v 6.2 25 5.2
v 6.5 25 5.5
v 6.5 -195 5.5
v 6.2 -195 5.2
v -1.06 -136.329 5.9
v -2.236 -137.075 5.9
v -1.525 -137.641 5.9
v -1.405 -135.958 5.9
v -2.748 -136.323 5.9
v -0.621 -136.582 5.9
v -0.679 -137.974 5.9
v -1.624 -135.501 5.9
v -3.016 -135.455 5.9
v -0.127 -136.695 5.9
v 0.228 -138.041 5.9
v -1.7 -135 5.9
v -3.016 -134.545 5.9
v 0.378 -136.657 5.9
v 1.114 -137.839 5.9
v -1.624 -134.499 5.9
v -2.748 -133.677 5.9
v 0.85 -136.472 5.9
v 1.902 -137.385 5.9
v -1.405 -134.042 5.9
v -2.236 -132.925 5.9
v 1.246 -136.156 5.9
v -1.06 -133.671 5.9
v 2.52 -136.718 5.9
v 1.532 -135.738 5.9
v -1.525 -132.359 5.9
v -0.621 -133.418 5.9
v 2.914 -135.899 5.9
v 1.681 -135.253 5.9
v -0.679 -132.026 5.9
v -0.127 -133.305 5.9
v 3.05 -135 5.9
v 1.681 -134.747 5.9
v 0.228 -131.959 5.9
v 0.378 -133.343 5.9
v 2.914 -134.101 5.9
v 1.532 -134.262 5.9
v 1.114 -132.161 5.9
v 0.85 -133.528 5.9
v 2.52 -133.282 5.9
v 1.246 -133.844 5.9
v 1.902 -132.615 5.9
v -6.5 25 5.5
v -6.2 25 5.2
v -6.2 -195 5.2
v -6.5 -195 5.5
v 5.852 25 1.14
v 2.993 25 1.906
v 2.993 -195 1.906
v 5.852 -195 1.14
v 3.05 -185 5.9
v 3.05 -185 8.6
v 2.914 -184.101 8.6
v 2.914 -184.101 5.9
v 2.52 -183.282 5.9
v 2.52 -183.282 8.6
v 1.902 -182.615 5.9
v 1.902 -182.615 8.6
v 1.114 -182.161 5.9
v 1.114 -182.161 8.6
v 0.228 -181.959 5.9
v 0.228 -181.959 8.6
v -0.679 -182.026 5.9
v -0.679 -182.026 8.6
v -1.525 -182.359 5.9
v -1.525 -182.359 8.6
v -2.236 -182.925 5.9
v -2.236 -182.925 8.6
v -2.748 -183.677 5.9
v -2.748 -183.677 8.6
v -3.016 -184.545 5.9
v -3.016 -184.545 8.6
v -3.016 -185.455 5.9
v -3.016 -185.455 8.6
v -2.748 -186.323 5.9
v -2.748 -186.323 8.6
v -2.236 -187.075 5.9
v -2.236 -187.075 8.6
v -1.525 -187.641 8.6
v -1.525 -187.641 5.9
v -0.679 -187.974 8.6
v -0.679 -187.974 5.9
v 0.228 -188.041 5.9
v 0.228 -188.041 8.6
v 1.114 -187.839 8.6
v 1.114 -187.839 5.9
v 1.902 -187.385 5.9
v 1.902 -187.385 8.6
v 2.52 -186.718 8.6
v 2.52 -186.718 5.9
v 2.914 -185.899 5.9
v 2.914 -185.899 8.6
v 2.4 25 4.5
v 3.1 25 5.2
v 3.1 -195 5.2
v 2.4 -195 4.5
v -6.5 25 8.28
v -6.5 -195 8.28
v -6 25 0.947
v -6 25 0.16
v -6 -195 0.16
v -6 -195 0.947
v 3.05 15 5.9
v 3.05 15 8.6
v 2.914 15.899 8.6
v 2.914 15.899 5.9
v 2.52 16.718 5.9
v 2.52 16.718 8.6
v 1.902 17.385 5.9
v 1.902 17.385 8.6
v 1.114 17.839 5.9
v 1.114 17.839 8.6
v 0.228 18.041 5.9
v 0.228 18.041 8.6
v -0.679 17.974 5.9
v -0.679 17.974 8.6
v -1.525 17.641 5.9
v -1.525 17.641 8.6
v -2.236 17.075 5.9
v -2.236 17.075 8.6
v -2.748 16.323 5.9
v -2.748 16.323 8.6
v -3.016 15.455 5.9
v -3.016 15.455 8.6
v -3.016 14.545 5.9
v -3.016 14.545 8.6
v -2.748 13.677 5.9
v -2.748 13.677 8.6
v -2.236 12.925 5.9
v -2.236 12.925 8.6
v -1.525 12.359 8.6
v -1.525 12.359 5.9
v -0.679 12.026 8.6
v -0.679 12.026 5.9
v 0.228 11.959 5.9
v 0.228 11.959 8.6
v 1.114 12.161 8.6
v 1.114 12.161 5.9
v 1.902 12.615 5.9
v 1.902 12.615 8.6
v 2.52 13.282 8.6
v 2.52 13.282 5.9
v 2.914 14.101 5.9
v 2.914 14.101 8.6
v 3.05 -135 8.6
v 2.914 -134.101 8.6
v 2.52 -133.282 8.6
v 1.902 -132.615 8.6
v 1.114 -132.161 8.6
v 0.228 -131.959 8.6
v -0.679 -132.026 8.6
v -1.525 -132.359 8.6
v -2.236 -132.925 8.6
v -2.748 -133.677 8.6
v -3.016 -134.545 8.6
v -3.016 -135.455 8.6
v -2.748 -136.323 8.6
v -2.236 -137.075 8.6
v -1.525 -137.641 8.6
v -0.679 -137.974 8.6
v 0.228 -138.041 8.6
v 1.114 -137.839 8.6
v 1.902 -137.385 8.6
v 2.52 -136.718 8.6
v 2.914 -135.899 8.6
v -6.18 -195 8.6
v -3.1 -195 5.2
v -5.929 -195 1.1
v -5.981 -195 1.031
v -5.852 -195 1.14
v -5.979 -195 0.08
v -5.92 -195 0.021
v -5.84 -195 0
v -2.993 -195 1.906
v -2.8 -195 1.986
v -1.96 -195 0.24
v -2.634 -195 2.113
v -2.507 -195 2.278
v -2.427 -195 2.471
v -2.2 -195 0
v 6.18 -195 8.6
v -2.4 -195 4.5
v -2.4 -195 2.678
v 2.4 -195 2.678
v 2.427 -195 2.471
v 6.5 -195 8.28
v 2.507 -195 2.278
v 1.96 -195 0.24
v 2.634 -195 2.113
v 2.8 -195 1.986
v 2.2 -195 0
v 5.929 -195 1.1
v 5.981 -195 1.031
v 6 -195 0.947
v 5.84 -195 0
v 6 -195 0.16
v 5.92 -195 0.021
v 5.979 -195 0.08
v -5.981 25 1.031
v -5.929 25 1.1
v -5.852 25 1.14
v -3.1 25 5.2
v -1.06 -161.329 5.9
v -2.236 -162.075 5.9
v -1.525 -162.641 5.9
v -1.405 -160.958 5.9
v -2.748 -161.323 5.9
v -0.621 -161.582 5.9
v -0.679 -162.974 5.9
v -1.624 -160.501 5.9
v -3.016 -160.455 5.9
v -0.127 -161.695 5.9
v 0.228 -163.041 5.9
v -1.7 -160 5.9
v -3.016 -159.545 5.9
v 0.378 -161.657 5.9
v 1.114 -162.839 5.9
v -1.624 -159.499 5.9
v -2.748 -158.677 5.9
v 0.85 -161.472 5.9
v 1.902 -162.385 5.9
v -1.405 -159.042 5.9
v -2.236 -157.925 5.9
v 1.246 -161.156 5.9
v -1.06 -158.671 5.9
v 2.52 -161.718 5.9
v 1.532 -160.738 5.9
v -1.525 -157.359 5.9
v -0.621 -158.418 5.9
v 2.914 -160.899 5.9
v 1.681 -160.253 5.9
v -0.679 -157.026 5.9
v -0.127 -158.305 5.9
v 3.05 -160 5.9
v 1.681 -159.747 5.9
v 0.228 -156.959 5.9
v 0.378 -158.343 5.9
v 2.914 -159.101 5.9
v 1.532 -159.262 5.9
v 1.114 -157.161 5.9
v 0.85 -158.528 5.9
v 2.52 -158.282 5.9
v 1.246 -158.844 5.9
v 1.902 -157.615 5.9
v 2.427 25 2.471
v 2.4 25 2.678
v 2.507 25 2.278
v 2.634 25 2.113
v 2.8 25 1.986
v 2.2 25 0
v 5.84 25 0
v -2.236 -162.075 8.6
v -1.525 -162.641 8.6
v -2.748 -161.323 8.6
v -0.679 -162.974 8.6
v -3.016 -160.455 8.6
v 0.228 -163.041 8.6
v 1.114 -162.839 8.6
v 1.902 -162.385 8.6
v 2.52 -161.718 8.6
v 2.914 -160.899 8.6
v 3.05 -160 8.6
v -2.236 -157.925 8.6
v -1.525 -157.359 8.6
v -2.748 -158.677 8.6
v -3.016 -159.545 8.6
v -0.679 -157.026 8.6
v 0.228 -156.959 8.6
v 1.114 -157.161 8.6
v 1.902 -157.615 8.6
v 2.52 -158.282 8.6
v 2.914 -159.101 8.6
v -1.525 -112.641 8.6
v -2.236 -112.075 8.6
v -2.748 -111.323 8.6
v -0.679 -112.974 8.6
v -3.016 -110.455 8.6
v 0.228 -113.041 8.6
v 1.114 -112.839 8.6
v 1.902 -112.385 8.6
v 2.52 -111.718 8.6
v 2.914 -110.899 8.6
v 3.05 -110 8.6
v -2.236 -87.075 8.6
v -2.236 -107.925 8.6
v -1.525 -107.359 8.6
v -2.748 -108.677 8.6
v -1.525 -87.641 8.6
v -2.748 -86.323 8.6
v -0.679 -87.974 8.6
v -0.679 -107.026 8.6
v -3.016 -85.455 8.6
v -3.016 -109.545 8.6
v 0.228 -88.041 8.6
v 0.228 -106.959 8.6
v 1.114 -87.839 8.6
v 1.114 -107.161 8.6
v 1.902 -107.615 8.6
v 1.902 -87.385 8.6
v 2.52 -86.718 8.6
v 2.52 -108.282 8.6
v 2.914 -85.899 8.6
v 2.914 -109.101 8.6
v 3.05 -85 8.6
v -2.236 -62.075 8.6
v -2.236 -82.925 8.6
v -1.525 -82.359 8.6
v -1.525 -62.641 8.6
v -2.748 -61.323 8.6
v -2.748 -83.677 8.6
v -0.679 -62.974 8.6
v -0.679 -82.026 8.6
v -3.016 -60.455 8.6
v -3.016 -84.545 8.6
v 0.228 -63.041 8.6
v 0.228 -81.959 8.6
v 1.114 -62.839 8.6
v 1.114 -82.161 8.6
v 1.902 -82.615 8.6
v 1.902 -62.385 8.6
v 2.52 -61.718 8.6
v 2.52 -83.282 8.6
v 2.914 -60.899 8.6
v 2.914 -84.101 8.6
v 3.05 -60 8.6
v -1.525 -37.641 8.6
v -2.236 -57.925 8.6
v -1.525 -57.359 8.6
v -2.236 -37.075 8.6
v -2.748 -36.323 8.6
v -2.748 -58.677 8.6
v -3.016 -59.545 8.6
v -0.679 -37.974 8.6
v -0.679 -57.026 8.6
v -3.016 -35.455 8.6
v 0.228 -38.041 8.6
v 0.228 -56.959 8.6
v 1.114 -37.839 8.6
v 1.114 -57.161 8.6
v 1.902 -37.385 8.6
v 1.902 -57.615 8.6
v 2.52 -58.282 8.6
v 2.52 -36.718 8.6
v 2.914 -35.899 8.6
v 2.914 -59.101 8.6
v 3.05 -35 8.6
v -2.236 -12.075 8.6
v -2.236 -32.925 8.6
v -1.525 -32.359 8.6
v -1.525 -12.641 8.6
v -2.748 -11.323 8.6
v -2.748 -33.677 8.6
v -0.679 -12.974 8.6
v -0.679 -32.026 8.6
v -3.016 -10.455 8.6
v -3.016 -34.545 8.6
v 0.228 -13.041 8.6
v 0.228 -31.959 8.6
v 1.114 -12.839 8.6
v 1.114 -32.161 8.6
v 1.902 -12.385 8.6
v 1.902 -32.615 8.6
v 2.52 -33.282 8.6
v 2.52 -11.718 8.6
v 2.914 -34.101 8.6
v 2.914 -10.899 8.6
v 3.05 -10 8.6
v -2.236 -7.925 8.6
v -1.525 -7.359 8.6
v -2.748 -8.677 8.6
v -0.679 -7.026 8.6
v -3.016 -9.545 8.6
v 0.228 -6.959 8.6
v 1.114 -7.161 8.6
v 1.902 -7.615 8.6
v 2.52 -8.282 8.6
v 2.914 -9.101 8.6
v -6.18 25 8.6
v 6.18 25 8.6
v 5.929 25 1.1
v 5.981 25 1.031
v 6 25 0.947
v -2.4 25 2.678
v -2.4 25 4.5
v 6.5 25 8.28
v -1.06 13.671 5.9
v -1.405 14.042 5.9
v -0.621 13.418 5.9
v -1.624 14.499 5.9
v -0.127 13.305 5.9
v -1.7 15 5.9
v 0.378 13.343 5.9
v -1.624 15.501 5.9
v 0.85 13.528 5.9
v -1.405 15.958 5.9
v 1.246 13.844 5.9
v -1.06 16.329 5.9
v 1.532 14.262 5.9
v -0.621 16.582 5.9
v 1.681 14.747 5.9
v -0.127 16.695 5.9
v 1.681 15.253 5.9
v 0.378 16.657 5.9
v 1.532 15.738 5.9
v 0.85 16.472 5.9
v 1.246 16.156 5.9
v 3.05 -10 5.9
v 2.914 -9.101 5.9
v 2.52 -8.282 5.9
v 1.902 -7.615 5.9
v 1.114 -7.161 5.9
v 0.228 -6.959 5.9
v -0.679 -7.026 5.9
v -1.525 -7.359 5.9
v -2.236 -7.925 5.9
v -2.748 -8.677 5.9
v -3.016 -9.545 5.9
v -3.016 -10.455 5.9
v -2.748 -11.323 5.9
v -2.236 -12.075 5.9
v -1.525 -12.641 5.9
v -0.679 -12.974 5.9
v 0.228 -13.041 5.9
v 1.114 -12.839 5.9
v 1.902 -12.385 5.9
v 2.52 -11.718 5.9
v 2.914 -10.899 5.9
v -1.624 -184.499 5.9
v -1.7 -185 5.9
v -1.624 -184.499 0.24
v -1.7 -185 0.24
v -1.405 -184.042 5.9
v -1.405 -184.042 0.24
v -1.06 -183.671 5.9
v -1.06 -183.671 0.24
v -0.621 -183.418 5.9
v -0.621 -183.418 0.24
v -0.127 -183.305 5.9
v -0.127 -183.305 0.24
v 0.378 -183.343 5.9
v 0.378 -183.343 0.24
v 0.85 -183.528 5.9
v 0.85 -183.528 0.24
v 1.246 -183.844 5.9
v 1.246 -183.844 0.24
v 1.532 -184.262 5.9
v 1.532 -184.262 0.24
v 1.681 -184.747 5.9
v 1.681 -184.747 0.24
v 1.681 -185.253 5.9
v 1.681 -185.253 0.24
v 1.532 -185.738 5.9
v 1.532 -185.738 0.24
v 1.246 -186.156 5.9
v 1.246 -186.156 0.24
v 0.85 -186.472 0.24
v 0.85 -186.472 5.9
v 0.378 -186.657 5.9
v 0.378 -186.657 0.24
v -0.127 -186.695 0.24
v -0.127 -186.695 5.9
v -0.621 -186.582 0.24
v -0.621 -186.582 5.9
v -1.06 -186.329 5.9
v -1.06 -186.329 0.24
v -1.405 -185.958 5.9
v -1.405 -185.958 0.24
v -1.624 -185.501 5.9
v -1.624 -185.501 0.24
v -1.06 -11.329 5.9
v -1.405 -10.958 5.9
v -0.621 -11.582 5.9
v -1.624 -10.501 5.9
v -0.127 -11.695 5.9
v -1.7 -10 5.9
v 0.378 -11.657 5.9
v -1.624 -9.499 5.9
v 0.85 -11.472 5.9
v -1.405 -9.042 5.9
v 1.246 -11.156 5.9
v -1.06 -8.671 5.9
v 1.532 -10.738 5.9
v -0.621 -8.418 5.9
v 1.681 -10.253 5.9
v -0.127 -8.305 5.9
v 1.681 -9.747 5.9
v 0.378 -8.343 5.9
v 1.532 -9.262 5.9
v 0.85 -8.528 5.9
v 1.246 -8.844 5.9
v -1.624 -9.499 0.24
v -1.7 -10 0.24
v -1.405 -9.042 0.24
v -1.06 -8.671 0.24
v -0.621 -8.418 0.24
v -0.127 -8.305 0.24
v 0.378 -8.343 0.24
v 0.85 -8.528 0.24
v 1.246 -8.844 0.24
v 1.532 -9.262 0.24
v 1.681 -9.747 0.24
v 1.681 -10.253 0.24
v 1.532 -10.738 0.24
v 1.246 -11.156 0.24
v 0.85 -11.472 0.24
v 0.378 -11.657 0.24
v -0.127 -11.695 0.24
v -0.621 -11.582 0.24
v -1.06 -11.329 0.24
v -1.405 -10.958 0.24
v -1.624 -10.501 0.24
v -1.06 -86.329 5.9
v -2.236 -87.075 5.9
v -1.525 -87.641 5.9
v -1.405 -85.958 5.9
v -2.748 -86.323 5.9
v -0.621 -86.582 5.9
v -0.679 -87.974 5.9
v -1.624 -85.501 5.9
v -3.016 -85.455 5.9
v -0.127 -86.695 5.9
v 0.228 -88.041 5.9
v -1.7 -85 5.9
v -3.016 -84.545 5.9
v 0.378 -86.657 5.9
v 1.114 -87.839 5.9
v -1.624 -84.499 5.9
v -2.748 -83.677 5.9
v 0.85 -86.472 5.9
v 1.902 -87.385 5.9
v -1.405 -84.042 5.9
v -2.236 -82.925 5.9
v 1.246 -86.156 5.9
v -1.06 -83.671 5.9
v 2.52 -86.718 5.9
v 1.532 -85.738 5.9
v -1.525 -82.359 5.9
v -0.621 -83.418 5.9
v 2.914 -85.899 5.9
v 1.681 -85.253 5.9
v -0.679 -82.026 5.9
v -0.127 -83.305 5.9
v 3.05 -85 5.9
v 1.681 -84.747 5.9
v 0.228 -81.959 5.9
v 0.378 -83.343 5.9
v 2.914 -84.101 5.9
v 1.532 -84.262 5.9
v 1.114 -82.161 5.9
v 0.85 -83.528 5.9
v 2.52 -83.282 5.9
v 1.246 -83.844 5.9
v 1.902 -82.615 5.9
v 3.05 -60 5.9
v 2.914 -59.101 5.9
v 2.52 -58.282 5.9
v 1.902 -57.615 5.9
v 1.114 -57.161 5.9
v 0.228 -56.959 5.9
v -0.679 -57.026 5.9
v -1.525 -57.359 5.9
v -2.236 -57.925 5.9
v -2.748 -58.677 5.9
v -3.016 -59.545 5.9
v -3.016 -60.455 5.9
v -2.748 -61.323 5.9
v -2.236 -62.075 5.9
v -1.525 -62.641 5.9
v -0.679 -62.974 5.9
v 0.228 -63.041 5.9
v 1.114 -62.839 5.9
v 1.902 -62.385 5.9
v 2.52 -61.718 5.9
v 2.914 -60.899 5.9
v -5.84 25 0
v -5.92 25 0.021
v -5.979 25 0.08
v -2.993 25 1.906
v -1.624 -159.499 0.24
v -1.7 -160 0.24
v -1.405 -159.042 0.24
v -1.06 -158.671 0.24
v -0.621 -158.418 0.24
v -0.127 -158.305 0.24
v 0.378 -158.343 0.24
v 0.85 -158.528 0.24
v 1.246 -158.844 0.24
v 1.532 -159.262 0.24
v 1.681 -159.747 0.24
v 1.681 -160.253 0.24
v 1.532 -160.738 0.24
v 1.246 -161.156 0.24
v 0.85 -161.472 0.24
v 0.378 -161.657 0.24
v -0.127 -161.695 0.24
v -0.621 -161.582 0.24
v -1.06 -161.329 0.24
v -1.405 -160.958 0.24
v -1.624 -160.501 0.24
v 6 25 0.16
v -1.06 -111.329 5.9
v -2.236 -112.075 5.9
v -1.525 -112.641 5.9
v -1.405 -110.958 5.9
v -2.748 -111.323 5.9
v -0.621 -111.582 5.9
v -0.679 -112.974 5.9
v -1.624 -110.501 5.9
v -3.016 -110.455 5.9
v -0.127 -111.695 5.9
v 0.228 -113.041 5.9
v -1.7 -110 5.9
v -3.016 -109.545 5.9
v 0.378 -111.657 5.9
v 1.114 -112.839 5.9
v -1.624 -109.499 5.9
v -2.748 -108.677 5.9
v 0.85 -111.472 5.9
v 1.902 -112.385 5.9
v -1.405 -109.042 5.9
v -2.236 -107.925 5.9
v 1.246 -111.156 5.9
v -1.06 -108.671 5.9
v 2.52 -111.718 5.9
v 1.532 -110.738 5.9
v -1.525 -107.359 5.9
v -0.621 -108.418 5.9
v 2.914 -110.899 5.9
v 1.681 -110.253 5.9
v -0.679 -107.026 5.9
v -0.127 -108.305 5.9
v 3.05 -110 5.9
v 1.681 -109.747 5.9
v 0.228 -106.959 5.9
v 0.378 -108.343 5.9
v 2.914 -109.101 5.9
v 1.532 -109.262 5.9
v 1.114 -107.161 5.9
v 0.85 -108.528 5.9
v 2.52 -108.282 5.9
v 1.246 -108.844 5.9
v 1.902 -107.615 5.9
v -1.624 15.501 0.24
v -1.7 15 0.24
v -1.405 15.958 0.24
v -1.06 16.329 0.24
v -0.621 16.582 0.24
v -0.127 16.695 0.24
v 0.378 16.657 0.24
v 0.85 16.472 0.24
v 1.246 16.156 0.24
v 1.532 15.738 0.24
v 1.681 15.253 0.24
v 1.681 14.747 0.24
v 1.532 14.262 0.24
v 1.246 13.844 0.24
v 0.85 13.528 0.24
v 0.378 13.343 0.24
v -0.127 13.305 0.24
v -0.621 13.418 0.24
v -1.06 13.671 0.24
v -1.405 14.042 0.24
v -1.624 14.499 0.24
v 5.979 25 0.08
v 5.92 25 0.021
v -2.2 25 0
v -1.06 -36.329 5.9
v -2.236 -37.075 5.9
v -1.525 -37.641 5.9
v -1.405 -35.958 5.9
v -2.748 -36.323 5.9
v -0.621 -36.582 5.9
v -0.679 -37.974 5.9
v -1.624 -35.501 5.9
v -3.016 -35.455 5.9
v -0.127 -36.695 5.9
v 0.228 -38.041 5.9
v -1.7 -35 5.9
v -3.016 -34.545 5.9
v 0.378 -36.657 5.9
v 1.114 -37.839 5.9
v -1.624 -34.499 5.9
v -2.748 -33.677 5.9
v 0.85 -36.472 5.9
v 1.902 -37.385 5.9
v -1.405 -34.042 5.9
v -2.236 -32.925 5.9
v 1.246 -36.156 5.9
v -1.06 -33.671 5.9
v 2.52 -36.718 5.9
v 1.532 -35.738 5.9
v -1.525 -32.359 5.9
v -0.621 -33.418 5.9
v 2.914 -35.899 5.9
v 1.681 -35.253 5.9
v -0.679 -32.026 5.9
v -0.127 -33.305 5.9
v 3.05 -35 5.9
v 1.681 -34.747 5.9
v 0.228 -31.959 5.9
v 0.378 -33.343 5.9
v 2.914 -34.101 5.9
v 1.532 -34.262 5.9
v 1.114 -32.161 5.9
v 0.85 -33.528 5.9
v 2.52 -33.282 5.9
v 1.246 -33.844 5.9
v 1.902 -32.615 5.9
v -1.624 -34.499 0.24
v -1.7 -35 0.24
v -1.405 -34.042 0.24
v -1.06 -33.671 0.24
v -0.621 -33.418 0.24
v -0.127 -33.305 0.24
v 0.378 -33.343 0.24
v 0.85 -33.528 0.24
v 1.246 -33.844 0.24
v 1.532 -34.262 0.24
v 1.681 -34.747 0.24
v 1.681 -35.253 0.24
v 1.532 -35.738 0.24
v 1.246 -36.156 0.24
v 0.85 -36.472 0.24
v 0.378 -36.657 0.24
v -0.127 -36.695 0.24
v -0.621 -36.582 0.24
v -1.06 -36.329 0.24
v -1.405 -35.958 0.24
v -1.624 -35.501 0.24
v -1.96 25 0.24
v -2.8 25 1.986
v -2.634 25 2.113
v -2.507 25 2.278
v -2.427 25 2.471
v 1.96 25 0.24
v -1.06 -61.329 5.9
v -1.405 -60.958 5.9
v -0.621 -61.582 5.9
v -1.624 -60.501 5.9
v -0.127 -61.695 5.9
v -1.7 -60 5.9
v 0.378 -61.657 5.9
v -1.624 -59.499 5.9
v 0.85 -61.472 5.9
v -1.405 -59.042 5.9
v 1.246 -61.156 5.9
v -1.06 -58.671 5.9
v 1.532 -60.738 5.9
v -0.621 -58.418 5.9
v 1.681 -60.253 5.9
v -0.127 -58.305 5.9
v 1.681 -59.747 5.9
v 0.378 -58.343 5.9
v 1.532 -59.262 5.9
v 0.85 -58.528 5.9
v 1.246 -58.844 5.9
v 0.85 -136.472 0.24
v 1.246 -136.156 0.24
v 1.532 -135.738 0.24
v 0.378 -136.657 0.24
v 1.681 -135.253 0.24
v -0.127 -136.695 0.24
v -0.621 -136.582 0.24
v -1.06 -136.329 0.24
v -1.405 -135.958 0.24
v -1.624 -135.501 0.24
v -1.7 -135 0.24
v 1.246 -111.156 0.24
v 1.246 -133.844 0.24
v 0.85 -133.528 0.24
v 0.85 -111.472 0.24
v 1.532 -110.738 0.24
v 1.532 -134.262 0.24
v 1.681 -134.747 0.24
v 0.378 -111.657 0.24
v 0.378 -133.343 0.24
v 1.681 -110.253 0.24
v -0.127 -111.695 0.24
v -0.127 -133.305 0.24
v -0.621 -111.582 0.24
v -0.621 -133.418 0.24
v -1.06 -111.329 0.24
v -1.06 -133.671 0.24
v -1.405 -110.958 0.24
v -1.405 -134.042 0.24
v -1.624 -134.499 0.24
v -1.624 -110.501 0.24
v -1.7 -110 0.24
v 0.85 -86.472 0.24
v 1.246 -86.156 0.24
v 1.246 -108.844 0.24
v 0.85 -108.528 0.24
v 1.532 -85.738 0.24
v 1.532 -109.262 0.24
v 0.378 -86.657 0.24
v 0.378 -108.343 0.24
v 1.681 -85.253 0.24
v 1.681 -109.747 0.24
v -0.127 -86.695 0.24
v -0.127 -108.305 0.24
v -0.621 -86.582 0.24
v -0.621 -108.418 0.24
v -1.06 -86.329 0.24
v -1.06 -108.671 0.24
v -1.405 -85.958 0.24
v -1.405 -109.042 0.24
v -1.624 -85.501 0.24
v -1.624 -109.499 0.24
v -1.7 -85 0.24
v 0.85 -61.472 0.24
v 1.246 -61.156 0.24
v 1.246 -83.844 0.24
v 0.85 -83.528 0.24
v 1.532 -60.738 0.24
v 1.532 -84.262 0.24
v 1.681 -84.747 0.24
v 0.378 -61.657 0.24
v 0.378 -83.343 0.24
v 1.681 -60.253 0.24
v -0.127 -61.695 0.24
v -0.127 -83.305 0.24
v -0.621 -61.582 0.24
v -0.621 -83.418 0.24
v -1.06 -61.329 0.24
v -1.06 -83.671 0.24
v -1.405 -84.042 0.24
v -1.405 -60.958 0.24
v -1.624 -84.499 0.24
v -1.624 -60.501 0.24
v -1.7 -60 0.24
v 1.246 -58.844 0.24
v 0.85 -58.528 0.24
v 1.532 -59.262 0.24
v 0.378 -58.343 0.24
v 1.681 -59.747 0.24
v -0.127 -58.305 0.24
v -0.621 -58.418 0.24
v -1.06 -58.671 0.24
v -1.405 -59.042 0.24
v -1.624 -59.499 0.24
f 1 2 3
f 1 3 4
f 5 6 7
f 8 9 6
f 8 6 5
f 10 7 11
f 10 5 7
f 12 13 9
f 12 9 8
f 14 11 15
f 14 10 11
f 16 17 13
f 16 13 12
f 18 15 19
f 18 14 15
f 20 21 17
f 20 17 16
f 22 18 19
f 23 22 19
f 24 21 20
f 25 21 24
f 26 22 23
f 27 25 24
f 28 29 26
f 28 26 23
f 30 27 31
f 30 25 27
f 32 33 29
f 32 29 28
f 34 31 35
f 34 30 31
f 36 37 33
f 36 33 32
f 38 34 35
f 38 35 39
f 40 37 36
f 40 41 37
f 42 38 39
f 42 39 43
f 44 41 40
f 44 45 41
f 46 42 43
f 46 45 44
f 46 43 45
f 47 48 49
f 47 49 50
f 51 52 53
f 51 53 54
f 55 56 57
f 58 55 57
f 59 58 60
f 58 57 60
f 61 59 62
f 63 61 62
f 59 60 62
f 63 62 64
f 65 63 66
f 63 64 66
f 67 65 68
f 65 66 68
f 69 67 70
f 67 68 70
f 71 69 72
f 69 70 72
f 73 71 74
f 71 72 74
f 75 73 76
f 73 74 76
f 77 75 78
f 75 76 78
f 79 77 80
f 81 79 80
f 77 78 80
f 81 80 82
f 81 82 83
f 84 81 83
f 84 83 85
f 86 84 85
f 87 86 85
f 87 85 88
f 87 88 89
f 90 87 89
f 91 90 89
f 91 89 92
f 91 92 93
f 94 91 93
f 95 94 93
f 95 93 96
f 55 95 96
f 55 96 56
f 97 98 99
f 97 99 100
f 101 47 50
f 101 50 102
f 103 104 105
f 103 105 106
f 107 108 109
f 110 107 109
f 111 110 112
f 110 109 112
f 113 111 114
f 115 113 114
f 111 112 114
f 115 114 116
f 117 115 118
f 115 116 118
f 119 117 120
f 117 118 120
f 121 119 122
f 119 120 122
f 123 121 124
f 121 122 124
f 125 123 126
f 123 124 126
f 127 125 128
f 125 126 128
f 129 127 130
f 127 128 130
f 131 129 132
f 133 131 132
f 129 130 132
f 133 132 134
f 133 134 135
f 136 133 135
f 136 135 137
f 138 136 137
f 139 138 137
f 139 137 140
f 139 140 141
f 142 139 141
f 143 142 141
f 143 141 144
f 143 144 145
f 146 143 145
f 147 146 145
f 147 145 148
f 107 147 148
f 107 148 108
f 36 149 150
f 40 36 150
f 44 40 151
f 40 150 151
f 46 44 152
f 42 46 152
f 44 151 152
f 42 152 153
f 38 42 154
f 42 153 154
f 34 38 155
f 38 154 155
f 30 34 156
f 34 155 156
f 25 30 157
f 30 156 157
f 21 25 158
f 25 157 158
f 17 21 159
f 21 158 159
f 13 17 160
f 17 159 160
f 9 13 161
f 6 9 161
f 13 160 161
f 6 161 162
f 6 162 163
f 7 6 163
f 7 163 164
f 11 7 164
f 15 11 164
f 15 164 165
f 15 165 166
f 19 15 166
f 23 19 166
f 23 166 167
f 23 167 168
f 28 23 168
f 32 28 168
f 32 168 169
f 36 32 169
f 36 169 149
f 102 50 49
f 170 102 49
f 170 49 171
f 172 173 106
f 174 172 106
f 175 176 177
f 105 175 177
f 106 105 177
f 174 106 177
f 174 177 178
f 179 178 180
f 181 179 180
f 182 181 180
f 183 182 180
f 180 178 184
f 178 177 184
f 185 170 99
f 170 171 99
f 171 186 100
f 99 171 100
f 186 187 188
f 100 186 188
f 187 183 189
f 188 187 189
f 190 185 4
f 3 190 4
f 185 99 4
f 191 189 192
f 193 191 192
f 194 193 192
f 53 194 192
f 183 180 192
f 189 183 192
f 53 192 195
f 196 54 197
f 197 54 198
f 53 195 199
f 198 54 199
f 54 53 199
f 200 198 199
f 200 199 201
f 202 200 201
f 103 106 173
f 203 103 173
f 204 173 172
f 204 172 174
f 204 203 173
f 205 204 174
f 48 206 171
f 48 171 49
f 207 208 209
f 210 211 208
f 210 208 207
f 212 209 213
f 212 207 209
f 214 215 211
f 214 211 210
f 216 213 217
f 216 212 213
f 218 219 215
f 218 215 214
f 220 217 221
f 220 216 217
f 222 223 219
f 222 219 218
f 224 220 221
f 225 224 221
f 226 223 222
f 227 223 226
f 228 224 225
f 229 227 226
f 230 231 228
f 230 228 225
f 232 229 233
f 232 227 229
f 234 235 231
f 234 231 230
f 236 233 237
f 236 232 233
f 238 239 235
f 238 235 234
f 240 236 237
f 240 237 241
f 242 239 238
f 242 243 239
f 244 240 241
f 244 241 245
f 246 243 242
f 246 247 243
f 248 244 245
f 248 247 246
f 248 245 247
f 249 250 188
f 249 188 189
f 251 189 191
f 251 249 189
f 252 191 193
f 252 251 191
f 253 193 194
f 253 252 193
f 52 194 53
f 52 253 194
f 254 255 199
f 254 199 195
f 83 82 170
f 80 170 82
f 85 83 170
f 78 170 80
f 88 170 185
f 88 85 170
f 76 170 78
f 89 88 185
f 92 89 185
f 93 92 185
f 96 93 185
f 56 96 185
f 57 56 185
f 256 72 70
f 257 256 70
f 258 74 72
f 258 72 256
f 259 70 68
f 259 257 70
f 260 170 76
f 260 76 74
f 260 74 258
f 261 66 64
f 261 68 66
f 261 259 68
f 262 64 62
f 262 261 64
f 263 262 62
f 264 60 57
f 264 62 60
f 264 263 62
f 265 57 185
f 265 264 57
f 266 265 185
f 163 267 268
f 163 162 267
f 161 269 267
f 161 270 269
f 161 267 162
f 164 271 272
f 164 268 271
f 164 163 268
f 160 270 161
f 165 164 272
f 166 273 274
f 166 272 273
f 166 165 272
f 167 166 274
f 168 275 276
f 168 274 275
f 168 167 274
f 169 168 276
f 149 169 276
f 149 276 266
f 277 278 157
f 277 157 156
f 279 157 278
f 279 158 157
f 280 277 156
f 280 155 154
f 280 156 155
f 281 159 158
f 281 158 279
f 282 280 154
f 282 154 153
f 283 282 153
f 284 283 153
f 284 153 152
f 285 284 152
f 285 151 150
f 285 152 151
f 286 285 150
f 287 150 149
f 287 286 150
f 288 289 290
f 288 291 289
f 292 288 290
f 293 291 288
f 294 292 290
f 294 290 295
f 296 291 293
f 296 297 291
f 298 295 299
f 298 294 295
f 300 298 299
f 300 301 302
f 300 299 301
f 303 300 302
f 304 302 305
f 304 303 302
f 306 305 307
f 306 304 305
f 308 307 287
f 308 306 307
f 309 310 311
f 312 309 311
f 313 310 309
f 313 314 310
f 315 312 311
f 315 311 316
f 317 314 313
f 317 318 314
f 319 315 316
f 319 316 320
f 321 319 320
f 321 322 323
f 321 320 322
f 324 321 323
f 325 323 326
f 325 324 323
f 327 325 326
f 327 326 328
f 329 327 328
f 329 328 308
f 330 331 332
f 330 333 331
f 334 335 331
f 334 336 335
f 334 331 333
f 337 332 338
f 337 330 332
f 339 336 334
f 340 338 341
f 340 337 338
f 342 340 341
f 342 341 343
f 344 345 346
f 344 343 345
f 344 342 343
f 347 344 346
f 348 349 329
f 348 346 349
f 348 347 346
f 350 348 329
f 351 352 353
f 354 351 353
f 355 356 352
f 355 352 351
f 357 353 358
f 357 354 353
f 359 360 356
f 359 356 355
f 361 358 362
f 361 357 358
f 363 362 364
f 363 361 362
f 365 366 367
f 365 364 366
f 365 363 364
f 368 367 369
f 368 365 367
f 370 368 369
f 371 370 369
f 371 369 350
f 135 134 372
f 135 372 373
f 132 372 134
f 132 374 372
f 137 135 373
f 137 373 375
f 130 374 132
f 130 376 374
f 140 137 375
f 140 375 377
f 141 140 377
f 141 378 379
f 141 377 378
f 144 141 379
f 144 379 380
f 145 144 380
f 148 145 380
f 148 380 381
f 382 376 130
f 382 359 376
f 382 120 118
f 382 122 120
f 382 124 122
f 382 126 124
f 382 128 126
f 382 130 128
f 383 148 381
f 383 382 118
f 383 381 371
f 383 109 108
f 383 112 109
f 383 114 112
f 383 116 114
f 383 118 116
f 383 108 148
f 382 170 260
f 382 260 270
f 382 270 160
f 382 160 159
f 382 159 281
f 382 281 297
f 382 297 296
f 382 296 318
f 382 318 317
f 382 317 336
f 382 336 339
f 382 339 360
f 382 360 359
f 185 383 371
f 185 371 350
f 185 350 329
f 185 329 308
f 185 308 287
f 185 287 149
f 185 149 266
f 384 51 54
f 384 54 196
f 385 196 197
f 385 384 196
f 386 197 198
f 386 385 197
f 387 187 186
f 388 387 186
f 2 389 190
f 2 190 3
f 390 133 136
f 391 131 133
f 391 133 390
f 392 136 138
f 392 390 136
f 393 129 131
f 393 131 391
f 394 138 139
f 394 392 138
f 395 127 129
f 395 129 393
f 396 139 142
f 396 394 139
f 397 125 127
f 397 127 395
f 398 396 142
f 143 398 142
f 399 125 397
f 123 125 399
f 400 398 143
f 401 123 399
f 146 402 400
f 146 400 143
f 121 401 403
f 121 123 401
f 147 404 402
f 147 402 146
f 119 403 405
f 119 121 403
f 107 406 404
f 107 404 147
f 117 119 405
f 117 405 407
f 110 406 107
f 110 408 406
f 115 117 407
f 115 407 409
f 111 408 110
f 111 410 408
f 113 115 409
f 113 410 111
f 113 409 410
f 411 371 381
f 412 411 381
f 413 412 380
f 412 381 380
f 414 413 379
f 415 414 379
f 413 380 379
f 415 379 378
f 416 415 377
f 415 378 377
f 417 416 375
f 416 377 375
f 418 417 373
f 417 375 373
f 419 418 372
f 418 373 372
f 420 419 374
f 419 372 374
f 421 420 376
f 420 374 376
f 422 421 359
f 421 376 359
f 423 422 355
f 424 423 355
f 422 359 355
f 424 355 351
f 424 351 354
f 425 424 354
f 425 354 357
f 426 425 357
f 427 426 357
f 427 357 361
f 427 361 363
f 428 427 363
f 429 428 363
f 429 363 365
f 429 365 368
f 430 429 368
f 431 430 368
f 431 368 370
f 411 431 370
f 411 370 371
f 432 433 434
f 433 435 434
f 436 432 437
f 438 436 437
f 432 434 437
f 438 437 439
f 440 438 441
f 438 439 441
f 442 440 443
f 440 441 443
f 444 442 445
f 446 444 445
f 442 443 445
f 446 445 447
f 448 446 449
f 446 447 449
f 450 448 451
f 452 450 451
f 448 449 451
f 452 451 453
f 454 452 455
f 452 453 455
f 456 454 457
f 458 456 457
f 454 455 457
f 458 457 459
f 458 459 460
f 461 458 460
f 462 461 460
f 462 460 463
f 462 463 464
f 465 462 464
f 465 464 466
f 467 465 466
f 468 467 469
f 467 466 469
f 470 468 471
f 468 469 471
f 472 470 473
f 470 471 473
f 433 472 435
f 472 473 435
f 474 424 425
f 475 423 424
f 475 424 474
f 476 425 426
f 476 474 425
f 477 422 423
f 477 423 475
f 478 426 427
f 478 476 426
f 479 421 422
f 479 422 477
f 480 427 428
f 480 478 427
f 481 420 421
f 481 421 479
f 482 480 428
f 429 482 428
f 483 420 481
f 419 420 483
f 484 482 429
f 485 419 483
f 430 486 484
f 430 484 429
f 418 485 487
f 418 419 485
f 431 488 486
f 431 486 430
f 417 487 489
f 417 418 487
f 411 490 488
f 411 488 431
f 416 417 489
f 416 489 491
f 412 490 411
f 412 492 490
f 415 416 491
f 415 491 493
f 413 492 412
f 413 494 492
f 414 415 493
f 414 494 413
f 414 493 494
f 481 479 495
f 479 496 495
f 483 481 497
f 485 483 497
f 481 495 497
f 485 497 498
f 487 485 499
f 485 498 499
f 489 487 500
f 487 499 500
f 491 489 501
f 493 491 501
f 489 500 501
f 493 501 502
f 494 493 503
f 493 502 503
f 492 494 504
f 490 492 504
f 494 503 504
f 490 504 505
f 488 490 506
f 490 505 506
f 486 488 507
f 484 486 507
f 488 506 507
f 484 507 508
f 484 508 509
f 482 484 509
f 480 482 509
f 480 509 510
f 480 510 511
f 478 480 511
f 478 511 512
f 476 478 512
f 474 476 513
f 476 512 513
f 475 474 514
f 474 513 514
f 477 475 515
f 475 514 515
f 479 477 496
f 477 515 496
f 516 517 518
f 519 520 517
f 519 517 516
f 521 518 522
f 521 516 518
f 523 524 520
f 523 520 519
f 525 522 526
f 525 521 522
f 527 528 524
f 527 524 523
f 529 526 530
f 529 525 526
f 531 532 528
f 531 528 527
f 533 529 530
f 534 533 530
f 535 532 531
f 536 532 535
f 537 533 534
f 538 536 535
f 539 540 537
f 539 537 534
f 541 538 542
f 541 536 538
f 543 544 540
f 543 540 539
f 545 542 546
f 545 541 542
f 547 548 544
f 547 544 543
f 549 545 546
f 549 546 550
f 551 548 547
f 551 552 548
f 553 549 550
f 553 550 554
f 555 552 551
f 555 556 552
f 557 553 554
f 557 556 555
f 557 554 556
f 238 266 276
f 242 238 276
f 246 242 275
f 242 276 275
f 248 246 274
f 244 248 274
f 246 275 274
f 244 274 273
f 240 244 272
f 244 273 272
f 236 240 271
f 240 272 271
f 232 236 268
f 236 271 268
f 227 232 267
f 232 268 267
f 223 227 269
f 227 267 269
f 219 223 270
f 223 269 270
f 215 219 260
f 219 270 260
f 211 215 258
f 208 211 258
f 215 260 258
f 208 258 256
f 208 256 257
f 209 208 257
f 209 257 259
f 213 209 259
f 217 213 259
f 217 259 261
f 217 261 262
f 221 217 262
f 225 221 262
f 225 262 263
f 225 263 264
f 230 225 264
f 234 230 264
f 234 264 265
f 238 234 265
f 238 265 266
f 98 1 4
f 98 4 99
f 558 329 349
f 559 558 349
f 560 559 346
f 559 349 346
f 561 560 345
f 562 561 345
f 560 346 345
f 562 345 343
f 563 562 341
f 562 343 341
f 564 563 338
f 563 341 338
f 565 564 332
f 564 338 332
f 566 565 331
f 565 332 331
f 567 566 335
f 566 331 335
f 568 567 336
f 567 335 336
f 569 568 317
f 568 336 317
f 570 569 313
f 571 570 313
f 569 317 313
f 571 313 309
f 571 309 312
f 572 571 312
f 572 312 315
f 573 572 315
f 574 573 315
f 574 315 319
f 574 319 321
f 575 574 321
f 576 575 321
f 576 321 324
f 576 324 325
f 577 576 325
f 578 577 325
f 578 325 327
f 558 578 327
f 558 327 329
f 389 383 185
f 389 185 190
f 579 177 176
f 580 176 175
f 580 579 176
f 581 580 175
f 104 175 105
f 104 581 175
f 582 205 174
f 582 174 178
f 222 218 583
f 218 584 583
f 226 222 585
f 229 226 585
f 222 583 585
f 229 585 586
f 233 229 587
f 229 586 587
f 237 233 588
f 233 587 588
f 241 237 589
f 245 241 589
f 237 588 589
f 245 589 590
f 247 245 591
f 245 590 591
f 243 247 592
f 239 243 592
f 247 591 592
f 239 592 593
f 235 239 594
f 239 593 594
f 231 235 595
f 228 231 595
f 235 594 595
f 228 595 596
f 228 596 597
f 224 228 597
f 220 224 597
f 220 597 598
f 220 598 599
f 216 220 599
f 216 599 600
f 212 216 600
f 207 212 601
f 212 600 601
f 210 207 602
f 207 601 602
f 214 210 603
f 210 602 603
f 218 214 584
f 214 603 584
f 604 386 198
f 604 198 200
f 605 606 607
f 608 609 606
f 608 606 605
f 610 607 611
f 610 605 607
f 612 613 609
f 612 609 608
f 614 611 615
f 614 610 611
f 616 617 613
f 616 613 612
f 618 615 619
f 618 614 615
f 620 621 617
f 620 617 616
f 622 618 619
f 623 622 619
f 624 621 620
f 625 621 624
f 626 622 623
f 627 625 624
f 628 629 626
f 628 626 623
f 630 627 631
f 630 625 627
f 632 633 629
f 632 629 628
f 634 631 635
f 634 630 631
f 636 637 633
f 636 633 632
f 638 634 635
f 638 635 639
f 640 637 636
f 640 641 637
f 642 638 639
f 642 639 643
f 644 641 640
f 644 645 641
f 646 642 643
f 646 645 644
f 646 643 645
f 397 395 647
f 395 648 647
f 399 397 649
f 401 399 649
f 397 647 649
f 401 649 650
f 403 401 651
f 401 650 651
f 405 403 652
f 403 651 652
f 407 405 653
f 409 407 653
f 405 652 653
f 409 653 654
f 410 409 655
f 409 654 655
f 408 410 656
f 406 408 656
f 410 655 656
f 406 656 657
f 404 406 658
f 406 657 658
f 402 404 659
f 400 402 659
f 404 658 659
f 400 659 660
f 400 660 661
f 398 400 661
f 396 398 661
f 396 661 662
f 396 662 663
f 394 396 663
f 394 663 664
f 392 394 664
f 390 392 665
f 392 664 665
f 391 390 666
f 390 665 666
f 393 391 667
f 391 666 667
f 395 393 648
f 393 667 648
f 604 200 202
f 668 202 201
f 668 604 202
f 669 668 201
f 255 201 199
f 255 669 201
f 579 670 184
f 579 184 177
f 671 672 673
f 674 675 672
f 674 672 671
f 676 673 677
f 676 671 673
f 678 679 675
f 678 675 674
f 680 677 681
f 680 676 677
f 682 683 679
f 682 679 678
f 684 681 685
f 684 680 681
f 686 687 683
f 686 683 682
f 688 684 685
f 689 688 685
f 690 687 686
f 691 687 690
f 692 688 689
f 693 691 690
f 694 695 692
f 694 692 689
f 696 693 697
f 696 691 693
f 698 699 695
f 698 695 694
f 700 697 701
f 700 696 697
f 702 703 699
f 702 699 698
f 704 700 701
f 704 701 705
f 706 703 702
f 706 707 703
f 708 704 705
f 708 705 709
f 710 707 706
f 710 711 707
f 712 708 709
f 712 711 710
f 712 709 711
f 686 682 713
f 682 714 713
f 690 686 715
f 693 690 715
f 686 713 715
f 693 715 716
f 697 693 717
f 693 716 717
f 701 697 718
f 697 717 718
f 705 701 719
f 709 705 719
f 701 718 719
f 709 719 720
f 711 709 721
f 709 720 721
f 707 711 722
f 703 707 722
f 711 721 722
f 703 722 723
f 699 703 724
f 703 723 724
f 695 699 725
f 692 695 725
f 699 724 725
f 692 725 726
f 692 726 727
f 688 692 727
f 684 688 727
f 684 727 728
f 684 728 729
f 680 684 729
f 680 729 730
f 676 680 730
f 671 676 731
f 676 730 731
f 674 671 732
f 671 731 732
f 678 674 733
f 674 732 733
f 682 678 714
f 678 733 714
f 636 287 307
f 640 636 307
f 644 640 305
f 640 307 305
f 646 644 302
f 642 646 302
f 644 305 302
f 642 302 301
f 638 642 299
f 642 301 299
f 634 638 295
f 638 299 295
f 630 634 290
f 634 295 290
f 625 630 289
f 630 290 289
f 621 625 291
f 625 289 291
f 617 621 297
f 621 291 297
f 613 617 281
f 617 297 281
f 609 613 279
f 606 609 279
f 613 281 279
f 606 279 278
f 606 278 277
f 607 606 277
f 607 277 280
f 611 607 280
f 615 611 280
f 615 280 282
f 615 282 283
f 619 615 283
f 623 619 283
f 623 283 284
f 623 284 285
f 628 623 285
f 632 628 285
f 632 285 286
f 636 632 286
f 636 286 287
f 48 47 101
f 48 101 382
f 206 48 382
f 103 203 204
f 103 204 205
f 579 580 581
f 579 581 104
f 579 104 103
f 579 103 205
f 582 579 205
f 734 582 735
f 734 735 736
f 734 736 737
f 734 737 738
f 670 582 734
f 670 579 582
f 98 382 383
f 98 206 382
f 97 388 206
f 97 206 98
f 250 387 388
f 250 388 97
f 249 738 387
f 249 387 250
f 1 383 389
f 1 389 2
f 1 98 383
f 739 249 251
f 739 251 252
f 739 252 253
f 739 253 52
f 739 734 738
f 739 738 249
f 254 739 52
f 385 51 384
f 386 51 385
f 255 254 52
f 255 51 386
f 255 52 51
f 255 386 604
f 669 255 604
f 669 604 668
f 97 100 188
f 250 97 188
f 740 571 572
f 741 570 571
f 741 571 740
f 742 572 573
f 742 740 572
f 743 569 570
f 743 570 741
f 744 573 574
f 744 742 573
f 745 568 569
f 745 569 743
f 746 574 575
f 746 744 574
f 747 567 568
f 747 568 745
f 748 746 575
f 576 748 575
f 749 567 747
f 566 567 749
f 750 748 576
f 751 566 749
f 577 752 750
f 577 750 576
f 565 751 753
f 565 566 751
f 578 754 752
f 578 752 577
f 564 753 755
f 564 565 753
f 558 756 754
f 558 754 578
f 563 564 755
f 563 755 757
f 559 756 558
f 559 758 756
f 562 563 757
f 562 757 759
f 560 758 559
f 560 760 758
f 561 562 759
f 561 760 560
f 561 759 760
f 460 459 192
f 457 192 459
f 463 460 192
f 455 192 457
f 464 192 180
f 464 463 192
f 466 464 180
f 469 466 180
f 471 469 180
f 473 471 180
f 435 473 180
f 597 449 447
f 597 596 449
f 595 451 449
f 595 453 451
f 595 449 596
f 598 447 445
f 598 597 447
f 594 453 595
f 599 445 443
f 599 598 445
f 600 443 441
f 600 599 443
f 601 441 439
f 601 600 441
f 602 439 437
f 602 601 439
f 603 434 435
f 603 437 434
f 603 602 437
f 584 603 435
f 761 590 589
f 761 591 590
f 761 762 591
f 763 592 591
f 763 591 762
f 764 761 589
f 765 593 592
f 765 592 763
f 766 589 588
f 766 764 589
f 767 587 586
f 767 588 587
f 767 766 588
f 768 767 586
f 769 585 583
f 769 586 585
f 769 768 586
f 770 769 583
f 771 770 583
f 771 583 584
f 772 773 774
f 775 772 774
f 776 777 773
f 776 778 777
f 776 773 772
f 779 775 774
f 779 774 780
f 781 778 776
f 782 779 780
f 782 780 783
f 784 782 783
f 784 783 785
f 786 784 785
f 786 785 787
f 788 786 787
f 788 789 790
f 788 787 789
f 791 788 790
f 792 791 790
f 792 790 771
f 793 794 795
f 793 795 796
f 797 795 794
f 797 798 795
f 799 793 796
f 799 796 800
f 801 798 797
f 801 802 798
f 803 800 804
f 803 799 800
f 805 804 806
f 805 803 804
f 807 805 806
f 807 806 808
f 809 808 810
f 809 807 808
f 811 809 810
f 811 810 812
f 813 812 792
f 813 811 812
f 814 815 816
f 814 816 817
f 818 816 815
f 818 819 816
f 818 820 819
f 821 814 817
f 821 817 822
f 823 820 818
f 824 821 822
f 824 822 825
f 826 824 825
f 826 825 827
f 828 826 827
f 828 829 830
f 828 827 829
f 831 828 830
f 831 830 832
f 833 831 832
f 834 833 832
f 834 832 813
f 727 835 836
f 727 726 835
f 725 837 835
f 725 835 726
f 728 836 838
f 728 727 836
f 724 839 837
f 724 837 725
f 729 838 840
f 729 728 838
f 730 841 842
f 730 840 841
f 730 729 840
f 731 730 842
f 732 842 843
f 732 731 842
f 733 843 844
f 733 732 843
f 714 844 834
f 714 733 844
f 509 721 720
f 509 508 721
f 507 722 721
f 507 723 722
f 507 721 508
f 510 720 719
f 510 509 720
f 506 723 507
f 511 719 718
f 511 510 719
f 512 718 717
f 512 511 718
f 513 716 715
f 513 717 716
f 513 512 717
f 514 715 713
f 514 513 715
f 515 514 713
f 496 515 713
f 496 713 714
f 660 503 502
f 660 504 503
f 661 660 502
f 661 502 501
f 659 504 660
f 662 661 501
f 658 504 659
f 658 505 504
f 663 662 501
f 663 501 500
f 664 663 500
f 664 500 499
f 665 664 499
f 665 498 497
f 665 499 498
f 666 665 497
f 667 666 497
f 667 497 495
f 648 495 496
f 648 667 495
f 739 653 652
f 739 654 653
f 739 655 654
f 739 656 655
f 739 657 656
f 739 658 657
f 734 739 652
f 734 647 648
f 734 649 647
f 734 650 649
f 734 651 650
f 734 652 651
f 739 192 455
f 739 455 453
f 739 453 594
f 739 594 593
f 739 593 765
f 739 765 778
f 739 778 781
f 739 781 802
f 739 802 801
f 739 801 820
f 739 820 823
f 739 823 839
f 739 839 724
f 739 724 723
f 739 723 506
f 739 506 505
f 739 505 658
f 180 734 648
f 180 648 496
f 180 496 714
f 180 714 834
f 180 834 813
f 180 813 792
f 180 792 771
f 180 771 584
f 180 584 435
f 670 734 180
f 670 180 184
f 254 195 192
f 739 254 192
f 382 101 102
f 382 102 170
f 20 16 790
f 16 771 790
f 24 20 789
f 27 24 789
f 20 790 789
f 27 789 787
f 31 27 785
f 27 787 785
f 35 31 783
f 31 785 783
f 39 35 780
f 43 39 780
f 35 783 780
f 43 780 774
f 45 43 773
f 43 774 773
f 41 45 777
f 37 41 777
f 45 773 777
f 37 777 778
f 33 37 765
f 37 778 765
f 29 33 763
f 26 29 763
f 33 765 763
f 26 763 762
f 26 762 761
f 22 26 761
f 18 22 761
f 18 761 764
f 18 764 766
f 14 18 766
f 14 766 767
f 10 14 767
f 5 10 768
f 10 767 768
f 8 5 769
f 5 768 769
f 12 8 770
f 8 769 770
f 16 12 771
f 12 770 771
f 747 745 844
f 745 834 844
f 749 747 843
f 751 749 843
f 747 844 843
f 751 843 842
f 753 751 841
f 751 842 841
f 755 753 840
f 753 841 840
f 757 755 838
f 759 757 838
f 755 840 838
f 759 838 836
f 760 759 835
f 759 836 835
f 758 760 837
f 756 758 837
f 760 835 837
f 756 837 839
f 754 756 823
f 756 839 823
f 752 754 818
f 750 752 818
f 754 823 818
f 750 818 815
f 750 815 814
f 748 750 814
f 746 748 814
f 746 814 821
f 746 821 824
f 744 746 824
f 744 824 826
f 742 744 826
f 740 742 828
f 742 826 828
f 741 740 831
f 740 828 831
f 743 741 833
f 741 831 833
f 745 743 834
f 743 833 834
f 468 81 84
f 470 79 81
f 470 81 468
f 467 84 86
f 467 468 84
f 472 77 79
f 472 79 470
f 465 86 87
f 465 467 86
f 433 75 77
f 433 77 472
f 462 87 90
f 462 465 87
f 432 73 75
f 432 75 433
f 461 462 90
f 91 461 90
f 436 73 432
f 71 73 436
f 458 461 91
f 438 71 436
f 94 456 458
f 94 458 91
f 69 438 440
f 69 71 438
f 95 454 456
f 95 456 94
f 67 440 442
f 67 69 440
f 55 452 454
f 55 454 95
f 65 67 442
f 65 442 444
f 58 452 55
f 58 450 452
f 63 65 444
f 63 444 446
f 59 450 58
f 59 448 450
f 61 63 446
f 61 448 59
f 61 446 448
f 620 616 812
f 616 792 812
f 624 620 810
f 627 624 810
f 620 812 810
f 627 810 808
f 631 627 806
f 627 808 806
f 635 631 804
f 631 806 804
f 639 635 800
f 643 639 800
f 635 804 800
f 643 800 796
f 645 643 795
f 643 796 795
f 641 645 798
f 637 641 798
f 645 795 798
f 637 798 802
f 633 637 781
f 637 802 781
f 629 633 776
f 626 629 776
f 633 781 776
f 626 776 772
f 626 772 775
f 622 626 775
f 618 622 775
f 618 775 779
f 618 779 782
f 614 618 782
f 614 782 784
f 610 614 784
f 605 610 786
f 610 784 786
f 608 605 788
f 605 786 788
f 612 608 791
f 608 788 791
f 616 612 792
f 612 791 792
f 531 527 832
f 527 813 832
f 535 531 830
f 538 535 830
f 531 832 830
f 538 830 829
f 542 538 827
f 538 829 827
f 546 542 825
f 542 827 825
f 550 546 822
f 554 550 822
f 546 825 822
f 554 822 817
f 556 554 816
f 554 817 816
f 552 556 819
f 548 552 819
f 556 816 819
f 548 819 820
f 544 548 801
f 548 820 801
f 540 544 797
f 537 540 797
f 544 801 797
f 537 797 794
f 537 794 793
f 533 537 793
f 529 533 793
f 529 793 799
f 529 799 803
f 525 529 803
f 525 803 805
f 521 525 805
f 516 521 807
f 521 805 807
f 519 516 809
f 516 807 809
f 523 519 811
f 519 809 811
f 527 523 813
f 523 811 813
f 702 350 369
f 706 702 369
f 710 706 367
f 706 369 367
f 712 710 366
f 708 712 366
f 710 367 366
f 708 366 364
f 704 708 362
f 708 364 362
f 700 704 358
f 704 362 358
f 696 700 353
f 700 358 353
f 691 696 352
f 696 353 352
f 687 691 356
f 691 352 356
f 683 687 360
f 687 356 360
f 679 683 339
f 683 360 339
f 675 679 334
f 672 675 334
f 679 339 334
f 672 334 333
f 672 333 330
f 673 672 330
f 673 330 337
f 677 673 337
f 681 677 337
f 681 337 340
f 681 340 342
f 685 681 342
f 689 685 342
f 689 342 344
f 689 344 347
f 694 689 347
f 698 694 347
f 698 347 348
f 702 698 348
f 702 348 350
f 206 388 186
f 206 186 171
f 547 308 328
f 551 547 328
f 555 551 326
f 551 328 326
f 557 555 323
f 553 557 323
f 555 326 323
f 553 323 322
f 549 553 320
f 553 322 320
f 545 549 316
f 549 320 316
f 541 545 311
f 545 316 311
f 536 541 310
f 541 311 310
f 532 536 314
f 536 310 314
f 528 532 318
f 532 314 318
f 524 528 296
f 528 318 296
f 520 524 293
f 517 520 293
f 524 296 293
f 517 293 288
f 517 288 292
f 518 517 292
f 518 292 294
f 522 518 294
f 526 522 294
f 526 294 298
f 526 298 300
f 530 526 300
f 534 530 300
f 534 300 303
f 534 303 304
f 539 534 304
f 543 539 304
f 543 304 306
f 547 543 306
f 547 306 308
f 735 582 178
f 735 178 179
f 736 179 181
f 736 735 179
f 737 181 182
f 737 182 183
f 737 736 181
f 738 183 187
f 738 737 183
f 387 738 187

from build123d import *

# Parameters (mm, degrees)
AUFSATZ_LINEAR_AUSTRAGEN1_DEPTH                     = 220
STIRNSENKUNG_F_R_M3_SECHSKANTSCHRAUBE_G_D           = 3.4
STIRNSENKUNG_F_R_M3_SECHSKANTSCHRAUBE_G_CBORE_D     = 6.1
STIRNSENKUNG_F_R_M3_SECHSKANTSCHRAUBE_G_CBORE_DEPTH = 2.7
FORMSCHR_GE1_ANGLE                                  = 45


with BuildPart() as part:
    # Skizze1 → Aufsatz-Linear austragen1 (new body)
    with BuildSketch(Plane(origin=(0, 25, 0), x_dir=(1, 0, 0), z_dir=(0, 1, 0))):
        with BuildLine():
            Line((1.959999996, -0.240000001), (-1.960000004, -0.240000001))
            Line((-1.960000004, -0.240000001), (-1.960000004, -1e-09))
            Line((-1.960000004, -1e-09), (-5.840000004, -1e-09))
            ThreePointArc((-5.840000004, -1e-09), (-5.953137089, -0.046862916), (-6.000000004, -0.160000001))
            Line((-6.000000004, -0.160000001), (-6.000000004, -0.946534601))
            ThreePointArc((-6.000000004, -0.946534601), (-5.958670671, -1.068286889), (-5.85176381, -1.13971977))
            Line((-5.85176381, -1.13971977), (-2.992944765, -1.905738019))
            ThreePointArc((-2.992944765, -1.905738019), (-2.565317328, -2.191469536), (-2.4, -2.67847868))
            Line((-2.4, -2.67847868), (-2.4, -4.5))
            Line((-2.4, -4.5), (-3.1, -5.2))
            Line((-3.1, -5.2), (-6.2, -5.2))
            Line((-6.2, -5.2), (-6.5, -5.5))
            Line((-6.5, -5.5), (-6.5, -8.28))
            Line((-6.5, -8.28), (-6.18, -8.6))
            Line((-6.18, -8.6), (6.18, -8.6))
            Line((6.18, -8.6), (6.5, -8.28))
            Line((6.5, -8.28), (6.5, -5.5))
            Line((6.5, -5.5), (6.2, -5.2))
            Line((6.2, -5.2), (3.1, -5.2))
            Line((3.1, -5.2), (2.4, -4.5))
            Line((2.4, -4.5), (2.4, -2.67847868))
            ThreePointArc((2.4, -2.67847868), (2.565317328, -2.191469536), (2.992944765, -1.905738019))
            Line((2.992944765, -1.905738019), (5.851763809, -1.139719768))
            ThreePointArc((5.851763809, -1.139719768), (5.958670669, -1.068286888), (6.000000002, -0.946534601))
            Line((6.000000002, -0.946534601), (6.000000002, -0.160000001))
            ThreePointArc((6.000000002, -0.160000001), (5.953137087, -0.046862916), (5.840000002, -1e-09))
            Line((5.840000002, -1e-09), (1.959999996, -1e-09))
            Line((1.959999996, -1e-09), (1.959999996, -0.240000001))
        make_face()
    extrude(amount=-AUFSATZ_LINEAR_AUSTRAGEN1_DEPTH)

    # Stirnsenkung für M3 Sechskantschraube, Gewinde bis Kopf1 (through all)
    with Locations(Plane.XY.offset(8.6)):
        with Locations((0, -85), (0, -60), (0, -35), (0, -10), (0, 15), (0, -110), (0, -135), (0, -160), (0, -185)):
            CounterBoreHole(STIRNSENKUNG_F_R_M3_SECHSKANTSCHRAUBE_G_D / 2, STIRNSENKUNG_F_R_M3_SECHSKANTSCHRAUBE_G_CBORE_D / 2, STIRNSENKUNG_F_R_M3_SECHSKANTSCHRAUBE_G_CBORE_DEPTH)

    # Formschräge1
    formschr_ge1_faces = [part.faces().sort_by_distance(p)[0] for p in [
        (-1.960000004, -85, 0.120000001),
        (1.959999996, -85, 0.120000001),
    ]]
    draft(formschr_ge1_faces, Plane(origin=(1.959999996, -195, 0.240000001), x_dir=(-1, 0, 0), z_dir=(0, 0, -1)), FORMSCHR_GE1_ANGLE)


solid = part.part
